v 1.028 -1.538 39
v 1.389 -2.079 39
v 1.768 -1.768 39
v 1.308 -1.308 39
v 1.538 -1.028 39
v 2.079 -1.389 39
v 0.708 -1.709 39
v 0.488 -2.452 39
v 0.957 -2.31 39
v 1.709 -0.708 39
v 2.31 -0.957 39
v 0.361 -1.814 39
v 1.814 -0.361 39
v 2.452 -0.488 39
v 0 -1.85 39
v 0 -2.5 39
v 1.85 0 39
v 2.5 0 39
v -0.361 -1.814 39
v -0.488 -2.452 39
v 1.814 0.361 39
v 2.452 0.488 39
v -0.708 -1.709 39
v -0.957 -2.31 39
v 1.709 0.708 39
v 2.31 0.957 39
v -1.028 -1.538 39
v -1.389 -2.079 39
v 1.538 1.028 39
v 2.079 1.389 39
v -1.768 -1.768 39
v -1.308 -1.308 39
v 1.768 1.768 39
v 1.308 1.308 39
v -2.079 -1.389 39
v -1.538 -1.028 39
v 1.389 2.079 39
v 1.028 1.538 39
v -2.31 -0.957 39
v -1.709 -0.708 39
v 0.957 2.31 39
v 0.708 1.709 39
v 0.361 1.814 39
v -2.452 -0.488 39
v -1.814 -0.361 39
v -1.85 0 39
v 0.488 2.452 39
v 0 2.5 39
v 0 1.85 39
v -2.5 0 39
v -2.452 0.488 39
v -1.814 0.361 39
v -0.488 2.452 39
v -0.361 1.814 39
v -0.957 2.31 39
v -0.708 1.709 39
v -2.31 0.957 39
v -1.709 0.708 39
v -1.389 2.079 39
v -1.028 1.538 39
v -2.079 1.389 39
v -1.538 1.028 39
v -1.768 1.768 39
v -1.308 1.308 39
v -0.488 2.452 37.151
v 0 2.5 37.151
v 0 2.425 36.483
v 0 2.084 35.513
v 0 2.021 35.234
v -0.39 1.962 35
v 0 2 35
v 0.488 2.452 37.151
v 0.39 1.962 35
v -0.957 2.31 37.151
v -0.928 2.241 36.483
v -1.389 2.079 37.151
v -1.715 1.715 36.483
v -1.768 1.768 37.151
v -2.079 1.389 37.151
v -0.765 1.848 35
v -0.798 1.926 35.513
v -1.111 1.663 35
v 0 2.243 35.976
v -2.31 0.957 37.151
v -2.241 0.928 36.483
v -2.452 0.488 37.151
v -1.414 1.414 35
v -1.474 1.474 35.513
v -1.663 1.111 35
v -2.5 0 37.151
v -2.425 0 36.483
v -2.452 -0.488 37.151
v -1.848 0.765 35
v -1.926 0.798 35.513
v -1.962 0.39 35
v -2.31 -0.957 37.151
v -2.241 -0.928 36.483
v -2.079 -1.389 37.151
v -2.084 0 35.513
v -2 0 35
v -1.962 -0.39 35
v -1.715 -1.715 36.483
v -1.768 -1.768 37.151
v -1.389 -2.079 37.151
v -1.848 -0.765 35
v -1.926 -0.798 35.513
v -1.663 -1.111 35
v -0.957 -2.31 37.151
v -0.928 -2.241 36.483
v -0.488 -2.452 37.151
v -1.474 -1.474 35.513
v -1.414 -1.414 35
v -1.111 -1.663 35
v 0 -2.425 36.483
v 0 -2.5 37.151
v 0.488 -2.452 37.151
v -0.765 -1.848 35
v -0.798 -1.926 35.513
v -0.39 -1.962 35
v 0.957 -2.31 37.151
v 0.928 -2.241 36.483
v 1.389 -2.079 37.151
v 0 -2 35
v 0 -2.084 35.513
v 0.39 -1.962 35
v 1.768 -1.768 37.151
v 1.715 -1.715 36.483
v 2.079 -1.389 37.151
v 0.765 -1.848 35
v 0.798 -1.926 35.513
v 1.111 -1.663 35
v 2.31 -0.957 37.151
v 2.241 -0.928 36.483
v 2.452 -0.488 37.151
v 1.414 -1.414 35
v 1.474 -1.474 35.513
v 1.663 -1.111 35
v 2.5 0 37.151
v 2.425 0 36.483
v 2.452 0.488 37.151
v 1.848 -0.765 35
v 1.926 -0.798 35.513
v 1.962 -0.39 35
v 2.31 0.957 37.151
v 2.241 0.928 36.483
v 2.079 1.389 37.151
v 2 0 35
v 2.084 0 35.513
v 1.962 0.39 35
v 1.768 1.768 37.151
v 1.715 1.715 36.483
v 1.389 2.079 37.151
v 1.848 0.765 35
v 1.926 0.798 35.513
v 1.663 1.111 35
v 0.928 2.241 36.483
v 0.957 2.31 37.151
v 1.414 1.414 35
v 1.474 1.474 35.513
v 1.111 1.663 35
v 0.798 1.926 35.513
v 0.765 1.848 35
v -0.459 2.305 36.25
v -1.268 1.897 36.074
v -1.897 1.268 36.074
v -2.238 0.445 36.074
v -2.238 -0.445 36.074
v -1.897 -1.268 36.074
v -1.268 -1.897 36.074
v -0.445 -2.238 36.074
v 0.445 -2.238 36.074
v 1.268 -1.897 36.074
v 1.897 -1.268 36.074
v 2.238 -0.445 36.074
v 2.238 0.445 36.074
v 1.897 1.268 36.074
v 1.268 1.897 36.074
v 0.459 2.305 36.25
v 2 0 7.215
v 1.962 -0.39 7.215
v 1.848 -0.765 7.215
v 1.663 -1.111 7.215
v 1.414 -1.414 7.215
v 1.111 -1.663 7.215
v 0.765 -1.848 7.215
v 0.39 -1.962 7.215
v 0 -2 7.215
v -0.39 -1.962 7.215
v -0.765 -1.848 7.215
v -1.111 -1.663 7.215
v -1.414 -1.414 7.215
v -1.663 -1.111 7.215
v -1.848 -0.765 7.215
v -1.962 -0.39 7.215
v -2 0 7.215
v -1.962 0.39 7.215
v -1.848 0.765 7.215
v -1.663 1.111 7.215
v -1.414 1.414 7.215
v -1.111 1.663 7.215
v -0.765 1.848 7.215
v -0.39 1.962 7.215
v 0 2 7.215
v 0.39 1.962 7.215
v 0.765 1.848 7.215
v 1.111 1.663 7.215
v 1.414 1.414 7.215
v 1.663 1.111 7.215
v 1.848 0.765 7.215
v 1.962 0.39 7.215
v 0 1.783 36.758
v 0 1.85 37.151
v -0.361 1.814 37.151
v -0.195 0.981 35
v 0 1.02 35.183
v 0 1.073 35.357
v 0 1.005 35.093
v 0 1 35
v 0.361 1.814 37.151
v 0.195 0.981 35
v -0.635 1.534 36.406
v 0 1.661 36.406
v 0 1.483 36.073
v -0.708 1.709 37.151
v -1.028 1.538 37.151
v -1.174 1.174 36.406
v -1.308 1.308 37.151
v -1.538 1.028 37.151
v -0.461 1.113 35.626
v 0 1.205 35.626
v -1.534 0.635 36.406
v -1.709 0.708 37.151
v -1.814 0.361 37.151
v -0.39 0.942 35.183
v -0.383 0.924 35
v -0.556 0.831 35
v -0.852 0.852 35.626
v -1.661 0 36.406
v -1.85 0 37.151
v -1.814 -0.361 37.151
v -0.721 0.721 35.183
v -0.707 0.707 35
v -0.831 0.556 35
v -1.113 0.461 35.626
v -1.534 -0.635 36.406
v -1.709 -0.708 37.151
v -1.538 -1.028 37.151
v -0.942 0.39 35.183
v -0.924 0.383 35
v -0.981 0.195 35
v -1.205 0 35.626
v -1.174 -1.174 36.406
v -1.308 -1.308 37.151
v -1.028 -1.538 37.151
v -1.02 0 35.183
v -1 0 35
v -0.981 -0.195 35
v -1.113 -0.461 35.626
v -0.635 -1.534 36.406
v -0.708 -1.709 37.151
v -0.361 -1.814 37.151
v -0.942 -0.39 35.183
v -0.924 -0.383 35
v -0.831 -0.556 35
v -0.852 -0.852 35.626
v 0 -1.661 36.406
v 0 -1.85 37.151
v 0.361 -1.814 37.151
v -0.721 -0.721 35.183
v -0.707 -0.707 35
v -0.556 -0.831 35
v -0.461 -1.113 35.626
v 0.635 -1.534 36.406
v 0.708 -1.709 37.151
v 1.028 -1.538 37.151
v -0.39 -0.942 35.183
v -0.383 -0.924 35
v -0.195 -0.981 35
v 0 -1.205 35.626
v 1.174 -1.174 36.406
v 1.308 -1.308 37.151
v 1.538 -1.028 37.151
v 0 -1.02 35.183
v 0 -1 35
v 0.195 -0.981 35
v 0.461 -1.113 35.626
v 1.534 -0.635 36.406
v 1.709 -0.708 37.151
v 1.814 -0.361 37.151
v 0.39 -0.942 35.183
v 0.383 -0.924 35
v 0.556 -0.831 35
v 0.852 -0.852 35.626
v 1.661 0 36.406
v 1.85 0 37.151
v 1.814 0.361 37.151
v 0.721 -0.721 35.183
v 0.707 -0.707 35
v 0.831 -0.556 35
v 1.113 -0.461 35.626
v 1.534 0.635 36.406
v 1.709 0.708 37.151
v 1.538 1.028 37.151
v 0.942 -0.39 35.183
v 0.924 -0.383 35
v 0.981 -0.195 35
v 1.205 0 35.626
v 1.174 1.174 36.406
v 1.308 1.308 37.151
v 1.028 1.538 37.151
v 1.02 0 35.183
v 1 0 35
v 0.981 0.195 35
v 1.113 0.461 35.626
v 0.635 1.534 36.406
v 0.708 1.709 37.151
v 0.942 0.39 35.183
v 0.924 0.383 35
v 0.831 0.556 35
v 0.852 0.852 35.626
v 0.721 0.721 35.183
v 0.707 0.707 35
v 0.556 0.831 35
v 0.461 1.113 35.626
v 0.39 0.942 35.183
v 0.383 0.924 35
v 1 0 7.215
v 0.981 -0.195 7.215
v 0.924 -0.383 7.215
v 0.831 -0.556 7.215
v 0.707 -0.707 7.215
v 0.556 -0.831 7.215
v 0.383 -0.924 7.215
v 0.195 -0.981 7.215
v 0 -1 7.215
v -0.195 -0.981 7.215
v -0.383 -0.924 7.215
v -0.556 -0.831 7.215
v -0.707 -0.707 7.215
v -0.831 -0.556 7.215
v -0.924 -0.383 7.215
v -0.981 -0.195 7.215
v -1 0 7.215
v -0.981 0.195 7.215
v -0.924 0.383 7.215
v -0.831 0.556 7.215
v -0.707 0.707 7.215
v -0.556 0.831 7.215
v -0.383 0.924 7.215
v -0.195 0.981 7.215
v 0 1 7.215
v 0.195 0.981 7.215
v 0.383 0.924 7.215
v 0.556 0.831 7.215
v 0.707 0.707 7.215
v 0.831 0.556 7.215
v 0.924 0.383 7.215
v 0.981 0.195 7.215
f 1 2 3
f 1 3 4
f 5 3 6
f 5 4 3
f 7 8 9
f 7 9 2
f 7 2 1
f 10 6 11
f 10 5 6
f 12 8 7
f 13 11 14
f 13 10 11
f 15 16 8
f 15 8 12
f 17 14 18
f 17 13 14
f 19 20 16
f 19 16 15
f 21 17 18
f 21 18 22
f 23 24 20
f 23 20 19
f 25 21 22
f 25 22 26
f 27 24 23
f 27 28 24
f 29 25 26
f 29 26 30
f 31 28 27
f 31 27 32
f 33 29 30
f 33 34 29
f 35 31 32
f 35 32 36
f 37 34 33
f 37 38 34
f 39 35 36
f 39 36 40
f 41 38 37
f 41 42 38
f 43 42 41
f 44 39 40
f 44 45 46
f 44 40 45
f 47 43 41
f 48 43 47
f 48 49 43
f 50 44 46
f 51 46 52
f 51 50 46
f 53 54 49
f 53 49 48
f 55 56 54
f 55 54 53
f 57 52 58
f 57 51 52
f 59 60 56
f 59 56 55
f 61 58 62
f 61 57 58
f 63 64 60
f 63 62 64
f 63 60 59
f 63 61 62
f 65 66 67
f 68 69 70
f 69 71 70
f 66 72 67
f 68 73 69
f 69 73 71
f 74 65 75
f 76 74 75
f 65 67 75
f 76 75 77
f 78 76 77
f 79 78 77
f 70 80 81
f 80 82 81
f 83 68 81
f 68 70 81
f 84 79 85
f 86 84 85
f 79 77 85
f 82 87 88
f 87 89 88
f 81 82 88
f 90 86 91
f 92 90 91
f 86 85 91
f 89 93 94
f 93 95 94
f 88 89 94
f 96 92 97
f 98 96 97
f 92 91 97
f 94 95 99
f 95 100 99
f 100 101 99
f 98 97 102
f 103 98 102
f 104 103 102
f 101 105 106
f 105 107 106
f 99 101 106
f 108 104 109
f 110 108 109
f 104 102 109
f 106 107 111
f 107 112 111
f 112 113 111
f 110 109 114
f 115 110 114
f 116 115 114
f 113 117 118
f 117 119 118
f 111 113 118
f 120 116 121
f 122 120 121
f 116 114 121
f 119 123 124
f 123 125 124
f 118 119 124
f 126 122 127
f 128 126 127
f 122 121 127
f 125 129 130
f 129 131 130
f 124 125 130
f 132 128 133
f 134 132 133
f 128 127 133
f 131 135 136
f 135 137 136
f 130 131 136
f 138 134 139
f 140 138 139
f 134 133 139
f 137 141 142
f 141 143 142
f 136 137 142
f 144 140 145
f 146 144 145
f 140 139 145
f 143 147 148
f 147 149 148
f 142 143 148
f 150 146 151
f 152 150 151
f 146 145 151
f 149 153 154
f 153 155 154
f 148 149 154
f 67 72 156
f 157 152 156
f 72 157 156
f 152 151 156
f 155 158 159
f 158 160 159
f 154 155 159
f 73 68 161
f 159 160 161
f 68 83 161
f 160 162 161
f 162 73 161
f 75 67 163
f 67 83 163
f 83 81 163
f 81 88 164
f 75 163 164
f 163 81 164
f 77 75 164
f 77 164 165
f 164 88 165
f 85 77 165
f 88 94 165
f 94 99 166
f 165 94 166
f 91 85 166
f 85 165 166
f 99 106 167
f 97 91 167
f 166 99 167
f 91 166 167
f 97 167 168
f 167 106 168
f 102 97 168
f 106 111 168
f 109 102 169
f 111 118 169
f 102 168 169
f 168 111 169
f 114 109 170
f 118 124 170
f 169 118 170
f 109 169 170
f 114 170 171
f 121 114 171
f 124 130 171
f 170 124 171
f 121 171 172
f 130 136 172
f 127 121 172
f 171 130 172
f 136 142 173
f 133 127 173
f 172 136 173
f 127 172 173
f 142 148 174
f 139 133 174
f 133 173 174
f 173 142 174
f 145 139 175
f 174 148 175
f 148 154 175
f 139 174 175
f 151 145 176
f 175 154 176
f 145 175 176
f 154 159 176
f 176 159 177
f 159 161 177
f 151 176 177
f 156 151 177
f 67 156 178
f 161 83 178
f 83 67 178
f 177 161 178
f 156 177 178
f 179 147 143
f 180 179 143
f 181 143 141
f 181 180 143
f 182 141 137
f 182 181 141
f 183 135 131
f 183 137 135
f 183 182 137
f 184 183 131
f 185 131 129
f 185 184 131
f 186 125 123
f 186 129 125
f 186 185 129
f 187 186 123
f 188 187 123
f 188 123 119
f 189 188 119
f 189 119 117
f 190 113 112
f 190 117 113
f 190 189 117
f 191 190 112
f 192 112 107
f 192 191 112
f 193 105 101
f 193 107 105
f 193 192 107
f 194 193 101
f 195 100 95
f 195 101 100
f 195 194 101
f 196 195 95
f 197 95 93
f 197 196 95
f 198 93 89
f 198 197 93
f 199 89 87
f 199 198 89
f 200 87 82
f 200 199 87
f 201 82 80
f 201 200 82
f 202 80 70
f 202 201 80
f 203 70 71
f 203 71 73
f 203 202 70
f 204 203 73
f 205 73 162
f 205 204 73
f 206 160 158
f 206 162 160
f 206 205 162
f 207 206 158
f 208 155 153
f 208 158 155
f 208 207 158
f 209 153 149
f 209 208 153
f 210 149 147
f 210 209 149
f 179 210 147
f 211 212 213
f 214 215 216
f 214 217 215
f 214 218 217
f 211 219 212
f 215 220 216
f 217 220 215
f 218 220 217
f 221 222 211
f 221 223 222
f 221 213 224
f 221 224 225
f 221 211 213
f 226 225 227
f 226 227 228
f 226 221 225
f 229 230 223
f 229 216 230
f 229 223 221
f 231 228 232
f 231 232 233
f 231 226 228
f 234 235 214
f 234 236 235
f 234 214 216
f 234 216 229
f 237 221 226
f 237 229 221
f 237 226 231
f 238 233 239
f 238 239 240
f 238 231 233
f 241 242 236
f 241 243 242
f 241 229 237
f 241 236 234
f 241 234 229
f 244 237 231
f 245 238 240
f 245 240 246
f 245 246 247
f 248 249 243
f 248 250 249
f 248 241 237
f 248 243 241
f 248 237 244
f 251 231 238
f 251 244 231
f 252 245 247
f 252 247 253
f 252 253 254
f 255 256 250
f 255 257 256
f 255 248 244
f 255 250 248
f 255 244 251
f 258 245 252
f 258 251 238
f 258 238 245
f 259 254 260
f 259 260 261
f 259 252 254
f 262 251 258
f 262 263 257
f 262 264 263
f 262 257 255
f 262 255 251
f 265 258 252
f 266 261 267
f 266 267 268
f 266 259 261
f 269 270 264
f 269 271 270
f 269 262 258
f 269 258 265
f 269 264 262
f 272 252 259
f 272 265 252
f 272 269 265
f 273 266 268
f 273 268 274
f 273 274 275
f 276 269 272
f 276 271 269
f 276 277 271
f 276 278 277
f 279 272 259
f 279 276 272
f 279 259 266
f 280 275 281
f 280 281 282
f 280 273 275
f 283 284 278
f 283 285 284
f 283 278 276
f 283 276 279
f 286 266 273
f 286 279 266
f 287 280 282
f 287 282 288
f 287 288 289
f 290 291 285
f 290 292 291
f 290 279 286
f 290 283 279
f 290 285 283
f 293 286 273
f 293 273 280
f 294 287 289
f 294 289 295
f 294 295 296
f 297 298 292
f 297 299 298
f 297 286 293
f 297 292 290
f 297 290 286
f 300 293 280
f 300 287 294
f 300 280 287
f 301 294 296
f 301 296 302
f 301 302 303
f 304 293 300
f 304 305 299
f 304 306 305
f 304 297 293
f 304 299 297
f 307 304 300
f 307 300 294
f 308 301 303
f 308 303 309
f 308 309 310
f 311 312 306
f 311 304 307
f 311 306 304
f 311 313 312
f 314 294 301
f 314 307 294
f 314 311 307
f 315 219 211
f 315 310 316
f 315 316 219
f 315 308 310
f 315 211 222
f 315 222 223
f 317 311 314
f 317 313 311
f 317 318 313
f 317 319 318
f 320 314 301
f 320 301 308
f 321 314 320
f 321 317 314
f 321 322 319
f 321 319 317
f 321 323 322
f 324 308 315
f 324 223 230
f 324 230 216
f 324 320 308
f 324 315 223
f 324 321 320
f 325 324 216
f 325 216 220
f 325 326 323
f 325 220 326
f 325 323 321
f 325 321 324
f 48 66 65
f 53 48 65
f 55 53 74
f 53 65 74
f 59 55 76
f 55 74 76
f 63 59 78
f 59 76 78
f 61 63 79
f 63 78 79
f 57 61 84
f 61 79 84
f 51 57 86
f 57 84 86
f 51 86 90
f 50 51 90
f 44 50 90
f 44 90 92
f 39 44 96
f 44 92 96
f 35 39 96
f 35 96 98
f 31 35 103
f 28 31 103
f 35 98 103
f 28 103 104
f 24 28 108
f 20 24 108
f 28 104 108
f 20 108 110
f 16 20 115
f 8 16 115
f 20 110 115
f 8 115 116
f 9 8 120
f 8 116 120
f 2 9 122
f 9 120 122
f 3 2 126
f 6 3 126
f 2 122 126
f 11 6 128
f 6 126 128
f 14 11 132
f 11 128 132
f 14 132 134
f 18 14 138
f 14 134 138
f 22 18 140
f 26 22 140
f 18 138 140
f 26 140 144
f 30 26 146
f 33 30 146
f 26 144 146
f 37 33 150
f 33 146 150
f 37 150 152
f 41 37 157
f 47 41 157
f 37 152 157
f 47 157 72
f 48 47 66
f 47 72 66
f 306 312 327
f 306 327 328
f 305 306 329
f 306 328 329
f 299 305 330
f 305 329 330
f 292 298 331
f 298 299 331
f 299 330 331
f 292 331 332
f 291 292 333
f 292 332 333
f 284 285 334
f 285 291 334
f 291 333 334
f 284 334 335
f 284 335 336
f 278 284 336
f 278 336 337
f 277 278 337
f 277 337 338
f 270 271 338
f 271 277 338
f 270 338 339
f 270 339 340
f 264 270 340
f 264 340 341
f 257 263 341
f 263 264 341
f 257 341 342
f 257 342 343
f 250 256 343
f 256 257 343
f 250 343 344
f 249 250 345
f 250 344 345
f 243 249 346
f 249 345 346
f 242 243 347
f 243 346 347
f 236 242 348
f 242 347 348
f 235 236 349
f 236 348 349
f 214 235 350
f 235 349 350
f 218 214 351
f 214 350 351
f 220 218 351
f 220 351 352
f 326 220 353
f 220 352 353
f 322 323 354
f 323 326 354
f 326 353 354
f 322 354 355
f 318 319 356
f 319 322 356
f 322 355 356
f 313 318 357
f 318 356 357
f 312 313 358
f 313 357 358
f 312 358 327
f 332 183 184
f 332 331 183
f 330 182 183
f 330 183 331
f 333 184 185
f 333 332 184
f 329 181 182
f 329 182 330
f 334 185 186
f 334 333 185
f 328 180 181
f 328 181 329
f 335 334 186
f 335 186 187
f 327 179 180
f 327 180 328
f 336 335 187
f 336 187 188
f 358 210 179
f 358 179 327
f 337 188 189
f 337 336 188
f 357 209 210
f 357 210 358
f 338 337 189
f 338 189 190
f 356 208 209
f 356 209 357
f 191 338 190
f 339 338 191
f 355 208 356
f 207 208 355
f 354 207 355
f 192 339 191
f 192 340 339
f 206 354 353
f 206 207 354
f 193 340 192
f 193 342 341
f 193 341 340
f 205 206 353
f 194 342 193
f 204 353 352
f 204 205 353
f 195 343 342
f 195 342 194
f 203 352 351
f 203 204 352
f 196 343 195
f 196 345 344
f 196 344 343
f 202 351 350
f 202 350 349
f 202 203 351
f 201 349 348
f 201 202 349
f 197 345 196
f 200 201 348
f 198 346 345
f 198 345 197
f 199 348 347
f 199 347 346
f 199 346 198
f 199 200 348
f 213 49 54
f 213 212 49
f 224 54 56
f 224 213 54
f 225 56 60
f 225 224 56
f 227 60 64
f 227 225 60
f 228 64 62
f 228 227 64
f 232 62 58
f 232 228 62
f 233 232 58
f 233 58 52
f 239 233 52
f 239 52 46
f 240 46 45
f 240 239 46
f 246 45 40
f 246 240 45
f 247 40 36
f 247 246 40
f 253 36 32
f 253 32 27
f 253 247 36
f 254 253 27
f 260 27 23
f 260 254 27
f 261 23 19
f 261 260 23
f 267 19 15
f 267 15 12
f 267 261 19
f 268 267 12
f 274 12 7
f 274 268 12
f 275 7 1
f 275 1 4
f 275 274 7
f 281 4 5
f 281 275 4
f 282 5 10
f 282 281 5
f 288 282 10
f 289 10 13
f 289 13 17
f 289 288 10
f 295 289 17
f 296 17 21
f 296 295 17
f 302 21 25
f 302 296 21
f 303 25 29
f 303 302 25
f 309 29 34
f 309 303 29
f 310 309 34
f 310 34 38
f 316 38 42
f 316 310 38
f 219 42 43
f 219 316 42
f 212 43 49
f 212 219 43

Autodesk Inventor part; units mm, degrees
ref_plane "YZ Plane" through (0, 0, 0) normal (1, 0, 0) x (0, 1, 0)
ref_plane "XZ Plane" through (0, 0, 0) normal (0, 1, 0) x (-1, 0, 0)
ref_plane "XY Plane" through (0, 0, 0) normal (0, 0, 1) x (1, 0, 0)
sketch "Sketch1" plane through (0, 0, 0) normal (0, 0, 1) x (1, 0, 0)
  circle A0 centre (0, 0) radius 2
  circle A1 centre (0, 0) radius 1
  dimension "d0" = 2
  dimension "d1" = 4
extrude "Extrusion1" add sketch "Sketch1" along normal blind 35
sketch "Sketch2" plane through (0, 0, 0) normal (1, 0, 0) x (0, 1, 0)
  line L0 (-2, 35) -> (2, 35) projected
  line L1 (-2, 35) -> (2, 35) projected
  line L2 (-2, 0) -> (2, 0) projected
  line L3 (1, 0) -> (1, 35) projected
  line L4 (2, 0) -> (2, 35) projected
  line L5 (-2, 0) -> (-2, 35) projected
  line L6 (0, -7.8082) -> (0, 46.8491) projected
  line L7 (-1, 0) -> (-1, 35) projected
  spline S0 degree 4 poles (2.5, 37.1511) (2.4385, 36.2785) (2.4715, 36.4932) (2, 35.6037) (2, 35) knots 0 0 0 0 0 1 1 1 1 1
  line L8 (1.85, 39) -> (2.5, 39)
  line L9 (2.5455, 37.7966) -> (2.4545, 36.5056) construction
  arc A0 (2.5379, 37.6674) -> (2.4651, 36.6346) centre (93.2146, 30.7544) ccw construction
  line L10 (1, 35) -> (2, 35)
  spline S1 degree 4 poles (1.85, 39) (1.85, 38.3805) (1.9584, 36.9535) (1.8064, 36.2993) (1, 35.4823) (1, 35) knots 0 0 0 0 0 0.518957 1 1 1 1 1
  line L11 (1.85, 39) -> (1.85, 33.7099)
  spline S2 degree 1 poles (2.5, 39) (2.5, 37.1511) knots 0 0 1 1
  point P0 (0, 0)
  point P1 (2.85, 39)
  point P2 (1.85, 37.1511)
  point P3 (1.4925, 36.0895)
  dimension "d6" = 1
  dimension "d9" = 4
  dimension "d10" = 0.65
  dimension "d11" = 2.5
revolve "Revolution1" add sketch "Sketch2" angle 360 about axis through (0, 0, -10) along (0, 0, 1) contours S1 L11 L0 | L11 S1 L8 S2 S0 L0
sketch "Sketch3" plane through (0, 0, 0) normal (0, 0, -1) x (-1, 0, 0)
  circle A0 centre (0, 0) radius 2 projected
  circle A1 centre (0, 0) radius 1 projected
  circle A2 centre (0, 0) radius 2
extrude "Extrusion2" cut sketch "Sketch3" against normal blind 7.215
equation "\"d0\" = GuideTubingID"
equation "\"d1\" = GuideTubingOD"
equation "\"d10\" = 0.65 * d6"
equation "\"baseOD\" = 23"
equation "\"baseInitD\" = 4"
equation "\"baseTh0\" = 48.463041deg"
equation "\"baseTh1\" = 23.073918deg"
equation "\"topD\" = 14"
equation "\"topInitD\" = 4"
equation "\"topTh0\" = 16.60155deg"
equation "\"topTh1\" = 86.796901deg"
equation "\"dFlexure\" = 0.38"
equation "\"lFlexure\" = 1.5"
equation "\"lFlexureOffset\" = 1.95"
equation "\"dMotor\" = 1.44"
equation "\"lMotor\" = 22.35"
equation "\"topH\" = 21.66629"
equation "\"springBaseD\" = 8"
equation "\"springTopD\" = 8"
equation "\"springInitL\" = 12.7"
equation "\"springLset\" = 3.5"
equation "\"springDeform\" = 18.16629"
equation "\"springL\" = 30.86629"
equation "\"springLO\" = 33.86629"
equation "\"springUnderCut\" = 9.2"
equation "\"dM1X\" = 6.73587"
equation "\"dM1Y\" = 2.34012"
equation "\"dM2X\" = -1.34133"
equation "\"dM2Y\" = 7.00349"
equation "\"dM1Xt\" = 6.59227"
equation "\"dM1Yt\" = -0.43704"
equation "\"dM2Xt\" = -3.67462"
equation "\"dM2Yt\" = 5.49055"
equation "\"GuideRod\" = 2"
equation "\"GuideTubingOD\" = 4"
equation "\"GuideTubingID\" = 2"
equation "\"CSpringOD\" = 5.537"
equation "\"CSpringCD\" = 0.254"
equation "\"CSpringID\" = 5.029"
equation "\"d7\" = d6"
properties part number "Spring Guide Tube" material "Viton"
